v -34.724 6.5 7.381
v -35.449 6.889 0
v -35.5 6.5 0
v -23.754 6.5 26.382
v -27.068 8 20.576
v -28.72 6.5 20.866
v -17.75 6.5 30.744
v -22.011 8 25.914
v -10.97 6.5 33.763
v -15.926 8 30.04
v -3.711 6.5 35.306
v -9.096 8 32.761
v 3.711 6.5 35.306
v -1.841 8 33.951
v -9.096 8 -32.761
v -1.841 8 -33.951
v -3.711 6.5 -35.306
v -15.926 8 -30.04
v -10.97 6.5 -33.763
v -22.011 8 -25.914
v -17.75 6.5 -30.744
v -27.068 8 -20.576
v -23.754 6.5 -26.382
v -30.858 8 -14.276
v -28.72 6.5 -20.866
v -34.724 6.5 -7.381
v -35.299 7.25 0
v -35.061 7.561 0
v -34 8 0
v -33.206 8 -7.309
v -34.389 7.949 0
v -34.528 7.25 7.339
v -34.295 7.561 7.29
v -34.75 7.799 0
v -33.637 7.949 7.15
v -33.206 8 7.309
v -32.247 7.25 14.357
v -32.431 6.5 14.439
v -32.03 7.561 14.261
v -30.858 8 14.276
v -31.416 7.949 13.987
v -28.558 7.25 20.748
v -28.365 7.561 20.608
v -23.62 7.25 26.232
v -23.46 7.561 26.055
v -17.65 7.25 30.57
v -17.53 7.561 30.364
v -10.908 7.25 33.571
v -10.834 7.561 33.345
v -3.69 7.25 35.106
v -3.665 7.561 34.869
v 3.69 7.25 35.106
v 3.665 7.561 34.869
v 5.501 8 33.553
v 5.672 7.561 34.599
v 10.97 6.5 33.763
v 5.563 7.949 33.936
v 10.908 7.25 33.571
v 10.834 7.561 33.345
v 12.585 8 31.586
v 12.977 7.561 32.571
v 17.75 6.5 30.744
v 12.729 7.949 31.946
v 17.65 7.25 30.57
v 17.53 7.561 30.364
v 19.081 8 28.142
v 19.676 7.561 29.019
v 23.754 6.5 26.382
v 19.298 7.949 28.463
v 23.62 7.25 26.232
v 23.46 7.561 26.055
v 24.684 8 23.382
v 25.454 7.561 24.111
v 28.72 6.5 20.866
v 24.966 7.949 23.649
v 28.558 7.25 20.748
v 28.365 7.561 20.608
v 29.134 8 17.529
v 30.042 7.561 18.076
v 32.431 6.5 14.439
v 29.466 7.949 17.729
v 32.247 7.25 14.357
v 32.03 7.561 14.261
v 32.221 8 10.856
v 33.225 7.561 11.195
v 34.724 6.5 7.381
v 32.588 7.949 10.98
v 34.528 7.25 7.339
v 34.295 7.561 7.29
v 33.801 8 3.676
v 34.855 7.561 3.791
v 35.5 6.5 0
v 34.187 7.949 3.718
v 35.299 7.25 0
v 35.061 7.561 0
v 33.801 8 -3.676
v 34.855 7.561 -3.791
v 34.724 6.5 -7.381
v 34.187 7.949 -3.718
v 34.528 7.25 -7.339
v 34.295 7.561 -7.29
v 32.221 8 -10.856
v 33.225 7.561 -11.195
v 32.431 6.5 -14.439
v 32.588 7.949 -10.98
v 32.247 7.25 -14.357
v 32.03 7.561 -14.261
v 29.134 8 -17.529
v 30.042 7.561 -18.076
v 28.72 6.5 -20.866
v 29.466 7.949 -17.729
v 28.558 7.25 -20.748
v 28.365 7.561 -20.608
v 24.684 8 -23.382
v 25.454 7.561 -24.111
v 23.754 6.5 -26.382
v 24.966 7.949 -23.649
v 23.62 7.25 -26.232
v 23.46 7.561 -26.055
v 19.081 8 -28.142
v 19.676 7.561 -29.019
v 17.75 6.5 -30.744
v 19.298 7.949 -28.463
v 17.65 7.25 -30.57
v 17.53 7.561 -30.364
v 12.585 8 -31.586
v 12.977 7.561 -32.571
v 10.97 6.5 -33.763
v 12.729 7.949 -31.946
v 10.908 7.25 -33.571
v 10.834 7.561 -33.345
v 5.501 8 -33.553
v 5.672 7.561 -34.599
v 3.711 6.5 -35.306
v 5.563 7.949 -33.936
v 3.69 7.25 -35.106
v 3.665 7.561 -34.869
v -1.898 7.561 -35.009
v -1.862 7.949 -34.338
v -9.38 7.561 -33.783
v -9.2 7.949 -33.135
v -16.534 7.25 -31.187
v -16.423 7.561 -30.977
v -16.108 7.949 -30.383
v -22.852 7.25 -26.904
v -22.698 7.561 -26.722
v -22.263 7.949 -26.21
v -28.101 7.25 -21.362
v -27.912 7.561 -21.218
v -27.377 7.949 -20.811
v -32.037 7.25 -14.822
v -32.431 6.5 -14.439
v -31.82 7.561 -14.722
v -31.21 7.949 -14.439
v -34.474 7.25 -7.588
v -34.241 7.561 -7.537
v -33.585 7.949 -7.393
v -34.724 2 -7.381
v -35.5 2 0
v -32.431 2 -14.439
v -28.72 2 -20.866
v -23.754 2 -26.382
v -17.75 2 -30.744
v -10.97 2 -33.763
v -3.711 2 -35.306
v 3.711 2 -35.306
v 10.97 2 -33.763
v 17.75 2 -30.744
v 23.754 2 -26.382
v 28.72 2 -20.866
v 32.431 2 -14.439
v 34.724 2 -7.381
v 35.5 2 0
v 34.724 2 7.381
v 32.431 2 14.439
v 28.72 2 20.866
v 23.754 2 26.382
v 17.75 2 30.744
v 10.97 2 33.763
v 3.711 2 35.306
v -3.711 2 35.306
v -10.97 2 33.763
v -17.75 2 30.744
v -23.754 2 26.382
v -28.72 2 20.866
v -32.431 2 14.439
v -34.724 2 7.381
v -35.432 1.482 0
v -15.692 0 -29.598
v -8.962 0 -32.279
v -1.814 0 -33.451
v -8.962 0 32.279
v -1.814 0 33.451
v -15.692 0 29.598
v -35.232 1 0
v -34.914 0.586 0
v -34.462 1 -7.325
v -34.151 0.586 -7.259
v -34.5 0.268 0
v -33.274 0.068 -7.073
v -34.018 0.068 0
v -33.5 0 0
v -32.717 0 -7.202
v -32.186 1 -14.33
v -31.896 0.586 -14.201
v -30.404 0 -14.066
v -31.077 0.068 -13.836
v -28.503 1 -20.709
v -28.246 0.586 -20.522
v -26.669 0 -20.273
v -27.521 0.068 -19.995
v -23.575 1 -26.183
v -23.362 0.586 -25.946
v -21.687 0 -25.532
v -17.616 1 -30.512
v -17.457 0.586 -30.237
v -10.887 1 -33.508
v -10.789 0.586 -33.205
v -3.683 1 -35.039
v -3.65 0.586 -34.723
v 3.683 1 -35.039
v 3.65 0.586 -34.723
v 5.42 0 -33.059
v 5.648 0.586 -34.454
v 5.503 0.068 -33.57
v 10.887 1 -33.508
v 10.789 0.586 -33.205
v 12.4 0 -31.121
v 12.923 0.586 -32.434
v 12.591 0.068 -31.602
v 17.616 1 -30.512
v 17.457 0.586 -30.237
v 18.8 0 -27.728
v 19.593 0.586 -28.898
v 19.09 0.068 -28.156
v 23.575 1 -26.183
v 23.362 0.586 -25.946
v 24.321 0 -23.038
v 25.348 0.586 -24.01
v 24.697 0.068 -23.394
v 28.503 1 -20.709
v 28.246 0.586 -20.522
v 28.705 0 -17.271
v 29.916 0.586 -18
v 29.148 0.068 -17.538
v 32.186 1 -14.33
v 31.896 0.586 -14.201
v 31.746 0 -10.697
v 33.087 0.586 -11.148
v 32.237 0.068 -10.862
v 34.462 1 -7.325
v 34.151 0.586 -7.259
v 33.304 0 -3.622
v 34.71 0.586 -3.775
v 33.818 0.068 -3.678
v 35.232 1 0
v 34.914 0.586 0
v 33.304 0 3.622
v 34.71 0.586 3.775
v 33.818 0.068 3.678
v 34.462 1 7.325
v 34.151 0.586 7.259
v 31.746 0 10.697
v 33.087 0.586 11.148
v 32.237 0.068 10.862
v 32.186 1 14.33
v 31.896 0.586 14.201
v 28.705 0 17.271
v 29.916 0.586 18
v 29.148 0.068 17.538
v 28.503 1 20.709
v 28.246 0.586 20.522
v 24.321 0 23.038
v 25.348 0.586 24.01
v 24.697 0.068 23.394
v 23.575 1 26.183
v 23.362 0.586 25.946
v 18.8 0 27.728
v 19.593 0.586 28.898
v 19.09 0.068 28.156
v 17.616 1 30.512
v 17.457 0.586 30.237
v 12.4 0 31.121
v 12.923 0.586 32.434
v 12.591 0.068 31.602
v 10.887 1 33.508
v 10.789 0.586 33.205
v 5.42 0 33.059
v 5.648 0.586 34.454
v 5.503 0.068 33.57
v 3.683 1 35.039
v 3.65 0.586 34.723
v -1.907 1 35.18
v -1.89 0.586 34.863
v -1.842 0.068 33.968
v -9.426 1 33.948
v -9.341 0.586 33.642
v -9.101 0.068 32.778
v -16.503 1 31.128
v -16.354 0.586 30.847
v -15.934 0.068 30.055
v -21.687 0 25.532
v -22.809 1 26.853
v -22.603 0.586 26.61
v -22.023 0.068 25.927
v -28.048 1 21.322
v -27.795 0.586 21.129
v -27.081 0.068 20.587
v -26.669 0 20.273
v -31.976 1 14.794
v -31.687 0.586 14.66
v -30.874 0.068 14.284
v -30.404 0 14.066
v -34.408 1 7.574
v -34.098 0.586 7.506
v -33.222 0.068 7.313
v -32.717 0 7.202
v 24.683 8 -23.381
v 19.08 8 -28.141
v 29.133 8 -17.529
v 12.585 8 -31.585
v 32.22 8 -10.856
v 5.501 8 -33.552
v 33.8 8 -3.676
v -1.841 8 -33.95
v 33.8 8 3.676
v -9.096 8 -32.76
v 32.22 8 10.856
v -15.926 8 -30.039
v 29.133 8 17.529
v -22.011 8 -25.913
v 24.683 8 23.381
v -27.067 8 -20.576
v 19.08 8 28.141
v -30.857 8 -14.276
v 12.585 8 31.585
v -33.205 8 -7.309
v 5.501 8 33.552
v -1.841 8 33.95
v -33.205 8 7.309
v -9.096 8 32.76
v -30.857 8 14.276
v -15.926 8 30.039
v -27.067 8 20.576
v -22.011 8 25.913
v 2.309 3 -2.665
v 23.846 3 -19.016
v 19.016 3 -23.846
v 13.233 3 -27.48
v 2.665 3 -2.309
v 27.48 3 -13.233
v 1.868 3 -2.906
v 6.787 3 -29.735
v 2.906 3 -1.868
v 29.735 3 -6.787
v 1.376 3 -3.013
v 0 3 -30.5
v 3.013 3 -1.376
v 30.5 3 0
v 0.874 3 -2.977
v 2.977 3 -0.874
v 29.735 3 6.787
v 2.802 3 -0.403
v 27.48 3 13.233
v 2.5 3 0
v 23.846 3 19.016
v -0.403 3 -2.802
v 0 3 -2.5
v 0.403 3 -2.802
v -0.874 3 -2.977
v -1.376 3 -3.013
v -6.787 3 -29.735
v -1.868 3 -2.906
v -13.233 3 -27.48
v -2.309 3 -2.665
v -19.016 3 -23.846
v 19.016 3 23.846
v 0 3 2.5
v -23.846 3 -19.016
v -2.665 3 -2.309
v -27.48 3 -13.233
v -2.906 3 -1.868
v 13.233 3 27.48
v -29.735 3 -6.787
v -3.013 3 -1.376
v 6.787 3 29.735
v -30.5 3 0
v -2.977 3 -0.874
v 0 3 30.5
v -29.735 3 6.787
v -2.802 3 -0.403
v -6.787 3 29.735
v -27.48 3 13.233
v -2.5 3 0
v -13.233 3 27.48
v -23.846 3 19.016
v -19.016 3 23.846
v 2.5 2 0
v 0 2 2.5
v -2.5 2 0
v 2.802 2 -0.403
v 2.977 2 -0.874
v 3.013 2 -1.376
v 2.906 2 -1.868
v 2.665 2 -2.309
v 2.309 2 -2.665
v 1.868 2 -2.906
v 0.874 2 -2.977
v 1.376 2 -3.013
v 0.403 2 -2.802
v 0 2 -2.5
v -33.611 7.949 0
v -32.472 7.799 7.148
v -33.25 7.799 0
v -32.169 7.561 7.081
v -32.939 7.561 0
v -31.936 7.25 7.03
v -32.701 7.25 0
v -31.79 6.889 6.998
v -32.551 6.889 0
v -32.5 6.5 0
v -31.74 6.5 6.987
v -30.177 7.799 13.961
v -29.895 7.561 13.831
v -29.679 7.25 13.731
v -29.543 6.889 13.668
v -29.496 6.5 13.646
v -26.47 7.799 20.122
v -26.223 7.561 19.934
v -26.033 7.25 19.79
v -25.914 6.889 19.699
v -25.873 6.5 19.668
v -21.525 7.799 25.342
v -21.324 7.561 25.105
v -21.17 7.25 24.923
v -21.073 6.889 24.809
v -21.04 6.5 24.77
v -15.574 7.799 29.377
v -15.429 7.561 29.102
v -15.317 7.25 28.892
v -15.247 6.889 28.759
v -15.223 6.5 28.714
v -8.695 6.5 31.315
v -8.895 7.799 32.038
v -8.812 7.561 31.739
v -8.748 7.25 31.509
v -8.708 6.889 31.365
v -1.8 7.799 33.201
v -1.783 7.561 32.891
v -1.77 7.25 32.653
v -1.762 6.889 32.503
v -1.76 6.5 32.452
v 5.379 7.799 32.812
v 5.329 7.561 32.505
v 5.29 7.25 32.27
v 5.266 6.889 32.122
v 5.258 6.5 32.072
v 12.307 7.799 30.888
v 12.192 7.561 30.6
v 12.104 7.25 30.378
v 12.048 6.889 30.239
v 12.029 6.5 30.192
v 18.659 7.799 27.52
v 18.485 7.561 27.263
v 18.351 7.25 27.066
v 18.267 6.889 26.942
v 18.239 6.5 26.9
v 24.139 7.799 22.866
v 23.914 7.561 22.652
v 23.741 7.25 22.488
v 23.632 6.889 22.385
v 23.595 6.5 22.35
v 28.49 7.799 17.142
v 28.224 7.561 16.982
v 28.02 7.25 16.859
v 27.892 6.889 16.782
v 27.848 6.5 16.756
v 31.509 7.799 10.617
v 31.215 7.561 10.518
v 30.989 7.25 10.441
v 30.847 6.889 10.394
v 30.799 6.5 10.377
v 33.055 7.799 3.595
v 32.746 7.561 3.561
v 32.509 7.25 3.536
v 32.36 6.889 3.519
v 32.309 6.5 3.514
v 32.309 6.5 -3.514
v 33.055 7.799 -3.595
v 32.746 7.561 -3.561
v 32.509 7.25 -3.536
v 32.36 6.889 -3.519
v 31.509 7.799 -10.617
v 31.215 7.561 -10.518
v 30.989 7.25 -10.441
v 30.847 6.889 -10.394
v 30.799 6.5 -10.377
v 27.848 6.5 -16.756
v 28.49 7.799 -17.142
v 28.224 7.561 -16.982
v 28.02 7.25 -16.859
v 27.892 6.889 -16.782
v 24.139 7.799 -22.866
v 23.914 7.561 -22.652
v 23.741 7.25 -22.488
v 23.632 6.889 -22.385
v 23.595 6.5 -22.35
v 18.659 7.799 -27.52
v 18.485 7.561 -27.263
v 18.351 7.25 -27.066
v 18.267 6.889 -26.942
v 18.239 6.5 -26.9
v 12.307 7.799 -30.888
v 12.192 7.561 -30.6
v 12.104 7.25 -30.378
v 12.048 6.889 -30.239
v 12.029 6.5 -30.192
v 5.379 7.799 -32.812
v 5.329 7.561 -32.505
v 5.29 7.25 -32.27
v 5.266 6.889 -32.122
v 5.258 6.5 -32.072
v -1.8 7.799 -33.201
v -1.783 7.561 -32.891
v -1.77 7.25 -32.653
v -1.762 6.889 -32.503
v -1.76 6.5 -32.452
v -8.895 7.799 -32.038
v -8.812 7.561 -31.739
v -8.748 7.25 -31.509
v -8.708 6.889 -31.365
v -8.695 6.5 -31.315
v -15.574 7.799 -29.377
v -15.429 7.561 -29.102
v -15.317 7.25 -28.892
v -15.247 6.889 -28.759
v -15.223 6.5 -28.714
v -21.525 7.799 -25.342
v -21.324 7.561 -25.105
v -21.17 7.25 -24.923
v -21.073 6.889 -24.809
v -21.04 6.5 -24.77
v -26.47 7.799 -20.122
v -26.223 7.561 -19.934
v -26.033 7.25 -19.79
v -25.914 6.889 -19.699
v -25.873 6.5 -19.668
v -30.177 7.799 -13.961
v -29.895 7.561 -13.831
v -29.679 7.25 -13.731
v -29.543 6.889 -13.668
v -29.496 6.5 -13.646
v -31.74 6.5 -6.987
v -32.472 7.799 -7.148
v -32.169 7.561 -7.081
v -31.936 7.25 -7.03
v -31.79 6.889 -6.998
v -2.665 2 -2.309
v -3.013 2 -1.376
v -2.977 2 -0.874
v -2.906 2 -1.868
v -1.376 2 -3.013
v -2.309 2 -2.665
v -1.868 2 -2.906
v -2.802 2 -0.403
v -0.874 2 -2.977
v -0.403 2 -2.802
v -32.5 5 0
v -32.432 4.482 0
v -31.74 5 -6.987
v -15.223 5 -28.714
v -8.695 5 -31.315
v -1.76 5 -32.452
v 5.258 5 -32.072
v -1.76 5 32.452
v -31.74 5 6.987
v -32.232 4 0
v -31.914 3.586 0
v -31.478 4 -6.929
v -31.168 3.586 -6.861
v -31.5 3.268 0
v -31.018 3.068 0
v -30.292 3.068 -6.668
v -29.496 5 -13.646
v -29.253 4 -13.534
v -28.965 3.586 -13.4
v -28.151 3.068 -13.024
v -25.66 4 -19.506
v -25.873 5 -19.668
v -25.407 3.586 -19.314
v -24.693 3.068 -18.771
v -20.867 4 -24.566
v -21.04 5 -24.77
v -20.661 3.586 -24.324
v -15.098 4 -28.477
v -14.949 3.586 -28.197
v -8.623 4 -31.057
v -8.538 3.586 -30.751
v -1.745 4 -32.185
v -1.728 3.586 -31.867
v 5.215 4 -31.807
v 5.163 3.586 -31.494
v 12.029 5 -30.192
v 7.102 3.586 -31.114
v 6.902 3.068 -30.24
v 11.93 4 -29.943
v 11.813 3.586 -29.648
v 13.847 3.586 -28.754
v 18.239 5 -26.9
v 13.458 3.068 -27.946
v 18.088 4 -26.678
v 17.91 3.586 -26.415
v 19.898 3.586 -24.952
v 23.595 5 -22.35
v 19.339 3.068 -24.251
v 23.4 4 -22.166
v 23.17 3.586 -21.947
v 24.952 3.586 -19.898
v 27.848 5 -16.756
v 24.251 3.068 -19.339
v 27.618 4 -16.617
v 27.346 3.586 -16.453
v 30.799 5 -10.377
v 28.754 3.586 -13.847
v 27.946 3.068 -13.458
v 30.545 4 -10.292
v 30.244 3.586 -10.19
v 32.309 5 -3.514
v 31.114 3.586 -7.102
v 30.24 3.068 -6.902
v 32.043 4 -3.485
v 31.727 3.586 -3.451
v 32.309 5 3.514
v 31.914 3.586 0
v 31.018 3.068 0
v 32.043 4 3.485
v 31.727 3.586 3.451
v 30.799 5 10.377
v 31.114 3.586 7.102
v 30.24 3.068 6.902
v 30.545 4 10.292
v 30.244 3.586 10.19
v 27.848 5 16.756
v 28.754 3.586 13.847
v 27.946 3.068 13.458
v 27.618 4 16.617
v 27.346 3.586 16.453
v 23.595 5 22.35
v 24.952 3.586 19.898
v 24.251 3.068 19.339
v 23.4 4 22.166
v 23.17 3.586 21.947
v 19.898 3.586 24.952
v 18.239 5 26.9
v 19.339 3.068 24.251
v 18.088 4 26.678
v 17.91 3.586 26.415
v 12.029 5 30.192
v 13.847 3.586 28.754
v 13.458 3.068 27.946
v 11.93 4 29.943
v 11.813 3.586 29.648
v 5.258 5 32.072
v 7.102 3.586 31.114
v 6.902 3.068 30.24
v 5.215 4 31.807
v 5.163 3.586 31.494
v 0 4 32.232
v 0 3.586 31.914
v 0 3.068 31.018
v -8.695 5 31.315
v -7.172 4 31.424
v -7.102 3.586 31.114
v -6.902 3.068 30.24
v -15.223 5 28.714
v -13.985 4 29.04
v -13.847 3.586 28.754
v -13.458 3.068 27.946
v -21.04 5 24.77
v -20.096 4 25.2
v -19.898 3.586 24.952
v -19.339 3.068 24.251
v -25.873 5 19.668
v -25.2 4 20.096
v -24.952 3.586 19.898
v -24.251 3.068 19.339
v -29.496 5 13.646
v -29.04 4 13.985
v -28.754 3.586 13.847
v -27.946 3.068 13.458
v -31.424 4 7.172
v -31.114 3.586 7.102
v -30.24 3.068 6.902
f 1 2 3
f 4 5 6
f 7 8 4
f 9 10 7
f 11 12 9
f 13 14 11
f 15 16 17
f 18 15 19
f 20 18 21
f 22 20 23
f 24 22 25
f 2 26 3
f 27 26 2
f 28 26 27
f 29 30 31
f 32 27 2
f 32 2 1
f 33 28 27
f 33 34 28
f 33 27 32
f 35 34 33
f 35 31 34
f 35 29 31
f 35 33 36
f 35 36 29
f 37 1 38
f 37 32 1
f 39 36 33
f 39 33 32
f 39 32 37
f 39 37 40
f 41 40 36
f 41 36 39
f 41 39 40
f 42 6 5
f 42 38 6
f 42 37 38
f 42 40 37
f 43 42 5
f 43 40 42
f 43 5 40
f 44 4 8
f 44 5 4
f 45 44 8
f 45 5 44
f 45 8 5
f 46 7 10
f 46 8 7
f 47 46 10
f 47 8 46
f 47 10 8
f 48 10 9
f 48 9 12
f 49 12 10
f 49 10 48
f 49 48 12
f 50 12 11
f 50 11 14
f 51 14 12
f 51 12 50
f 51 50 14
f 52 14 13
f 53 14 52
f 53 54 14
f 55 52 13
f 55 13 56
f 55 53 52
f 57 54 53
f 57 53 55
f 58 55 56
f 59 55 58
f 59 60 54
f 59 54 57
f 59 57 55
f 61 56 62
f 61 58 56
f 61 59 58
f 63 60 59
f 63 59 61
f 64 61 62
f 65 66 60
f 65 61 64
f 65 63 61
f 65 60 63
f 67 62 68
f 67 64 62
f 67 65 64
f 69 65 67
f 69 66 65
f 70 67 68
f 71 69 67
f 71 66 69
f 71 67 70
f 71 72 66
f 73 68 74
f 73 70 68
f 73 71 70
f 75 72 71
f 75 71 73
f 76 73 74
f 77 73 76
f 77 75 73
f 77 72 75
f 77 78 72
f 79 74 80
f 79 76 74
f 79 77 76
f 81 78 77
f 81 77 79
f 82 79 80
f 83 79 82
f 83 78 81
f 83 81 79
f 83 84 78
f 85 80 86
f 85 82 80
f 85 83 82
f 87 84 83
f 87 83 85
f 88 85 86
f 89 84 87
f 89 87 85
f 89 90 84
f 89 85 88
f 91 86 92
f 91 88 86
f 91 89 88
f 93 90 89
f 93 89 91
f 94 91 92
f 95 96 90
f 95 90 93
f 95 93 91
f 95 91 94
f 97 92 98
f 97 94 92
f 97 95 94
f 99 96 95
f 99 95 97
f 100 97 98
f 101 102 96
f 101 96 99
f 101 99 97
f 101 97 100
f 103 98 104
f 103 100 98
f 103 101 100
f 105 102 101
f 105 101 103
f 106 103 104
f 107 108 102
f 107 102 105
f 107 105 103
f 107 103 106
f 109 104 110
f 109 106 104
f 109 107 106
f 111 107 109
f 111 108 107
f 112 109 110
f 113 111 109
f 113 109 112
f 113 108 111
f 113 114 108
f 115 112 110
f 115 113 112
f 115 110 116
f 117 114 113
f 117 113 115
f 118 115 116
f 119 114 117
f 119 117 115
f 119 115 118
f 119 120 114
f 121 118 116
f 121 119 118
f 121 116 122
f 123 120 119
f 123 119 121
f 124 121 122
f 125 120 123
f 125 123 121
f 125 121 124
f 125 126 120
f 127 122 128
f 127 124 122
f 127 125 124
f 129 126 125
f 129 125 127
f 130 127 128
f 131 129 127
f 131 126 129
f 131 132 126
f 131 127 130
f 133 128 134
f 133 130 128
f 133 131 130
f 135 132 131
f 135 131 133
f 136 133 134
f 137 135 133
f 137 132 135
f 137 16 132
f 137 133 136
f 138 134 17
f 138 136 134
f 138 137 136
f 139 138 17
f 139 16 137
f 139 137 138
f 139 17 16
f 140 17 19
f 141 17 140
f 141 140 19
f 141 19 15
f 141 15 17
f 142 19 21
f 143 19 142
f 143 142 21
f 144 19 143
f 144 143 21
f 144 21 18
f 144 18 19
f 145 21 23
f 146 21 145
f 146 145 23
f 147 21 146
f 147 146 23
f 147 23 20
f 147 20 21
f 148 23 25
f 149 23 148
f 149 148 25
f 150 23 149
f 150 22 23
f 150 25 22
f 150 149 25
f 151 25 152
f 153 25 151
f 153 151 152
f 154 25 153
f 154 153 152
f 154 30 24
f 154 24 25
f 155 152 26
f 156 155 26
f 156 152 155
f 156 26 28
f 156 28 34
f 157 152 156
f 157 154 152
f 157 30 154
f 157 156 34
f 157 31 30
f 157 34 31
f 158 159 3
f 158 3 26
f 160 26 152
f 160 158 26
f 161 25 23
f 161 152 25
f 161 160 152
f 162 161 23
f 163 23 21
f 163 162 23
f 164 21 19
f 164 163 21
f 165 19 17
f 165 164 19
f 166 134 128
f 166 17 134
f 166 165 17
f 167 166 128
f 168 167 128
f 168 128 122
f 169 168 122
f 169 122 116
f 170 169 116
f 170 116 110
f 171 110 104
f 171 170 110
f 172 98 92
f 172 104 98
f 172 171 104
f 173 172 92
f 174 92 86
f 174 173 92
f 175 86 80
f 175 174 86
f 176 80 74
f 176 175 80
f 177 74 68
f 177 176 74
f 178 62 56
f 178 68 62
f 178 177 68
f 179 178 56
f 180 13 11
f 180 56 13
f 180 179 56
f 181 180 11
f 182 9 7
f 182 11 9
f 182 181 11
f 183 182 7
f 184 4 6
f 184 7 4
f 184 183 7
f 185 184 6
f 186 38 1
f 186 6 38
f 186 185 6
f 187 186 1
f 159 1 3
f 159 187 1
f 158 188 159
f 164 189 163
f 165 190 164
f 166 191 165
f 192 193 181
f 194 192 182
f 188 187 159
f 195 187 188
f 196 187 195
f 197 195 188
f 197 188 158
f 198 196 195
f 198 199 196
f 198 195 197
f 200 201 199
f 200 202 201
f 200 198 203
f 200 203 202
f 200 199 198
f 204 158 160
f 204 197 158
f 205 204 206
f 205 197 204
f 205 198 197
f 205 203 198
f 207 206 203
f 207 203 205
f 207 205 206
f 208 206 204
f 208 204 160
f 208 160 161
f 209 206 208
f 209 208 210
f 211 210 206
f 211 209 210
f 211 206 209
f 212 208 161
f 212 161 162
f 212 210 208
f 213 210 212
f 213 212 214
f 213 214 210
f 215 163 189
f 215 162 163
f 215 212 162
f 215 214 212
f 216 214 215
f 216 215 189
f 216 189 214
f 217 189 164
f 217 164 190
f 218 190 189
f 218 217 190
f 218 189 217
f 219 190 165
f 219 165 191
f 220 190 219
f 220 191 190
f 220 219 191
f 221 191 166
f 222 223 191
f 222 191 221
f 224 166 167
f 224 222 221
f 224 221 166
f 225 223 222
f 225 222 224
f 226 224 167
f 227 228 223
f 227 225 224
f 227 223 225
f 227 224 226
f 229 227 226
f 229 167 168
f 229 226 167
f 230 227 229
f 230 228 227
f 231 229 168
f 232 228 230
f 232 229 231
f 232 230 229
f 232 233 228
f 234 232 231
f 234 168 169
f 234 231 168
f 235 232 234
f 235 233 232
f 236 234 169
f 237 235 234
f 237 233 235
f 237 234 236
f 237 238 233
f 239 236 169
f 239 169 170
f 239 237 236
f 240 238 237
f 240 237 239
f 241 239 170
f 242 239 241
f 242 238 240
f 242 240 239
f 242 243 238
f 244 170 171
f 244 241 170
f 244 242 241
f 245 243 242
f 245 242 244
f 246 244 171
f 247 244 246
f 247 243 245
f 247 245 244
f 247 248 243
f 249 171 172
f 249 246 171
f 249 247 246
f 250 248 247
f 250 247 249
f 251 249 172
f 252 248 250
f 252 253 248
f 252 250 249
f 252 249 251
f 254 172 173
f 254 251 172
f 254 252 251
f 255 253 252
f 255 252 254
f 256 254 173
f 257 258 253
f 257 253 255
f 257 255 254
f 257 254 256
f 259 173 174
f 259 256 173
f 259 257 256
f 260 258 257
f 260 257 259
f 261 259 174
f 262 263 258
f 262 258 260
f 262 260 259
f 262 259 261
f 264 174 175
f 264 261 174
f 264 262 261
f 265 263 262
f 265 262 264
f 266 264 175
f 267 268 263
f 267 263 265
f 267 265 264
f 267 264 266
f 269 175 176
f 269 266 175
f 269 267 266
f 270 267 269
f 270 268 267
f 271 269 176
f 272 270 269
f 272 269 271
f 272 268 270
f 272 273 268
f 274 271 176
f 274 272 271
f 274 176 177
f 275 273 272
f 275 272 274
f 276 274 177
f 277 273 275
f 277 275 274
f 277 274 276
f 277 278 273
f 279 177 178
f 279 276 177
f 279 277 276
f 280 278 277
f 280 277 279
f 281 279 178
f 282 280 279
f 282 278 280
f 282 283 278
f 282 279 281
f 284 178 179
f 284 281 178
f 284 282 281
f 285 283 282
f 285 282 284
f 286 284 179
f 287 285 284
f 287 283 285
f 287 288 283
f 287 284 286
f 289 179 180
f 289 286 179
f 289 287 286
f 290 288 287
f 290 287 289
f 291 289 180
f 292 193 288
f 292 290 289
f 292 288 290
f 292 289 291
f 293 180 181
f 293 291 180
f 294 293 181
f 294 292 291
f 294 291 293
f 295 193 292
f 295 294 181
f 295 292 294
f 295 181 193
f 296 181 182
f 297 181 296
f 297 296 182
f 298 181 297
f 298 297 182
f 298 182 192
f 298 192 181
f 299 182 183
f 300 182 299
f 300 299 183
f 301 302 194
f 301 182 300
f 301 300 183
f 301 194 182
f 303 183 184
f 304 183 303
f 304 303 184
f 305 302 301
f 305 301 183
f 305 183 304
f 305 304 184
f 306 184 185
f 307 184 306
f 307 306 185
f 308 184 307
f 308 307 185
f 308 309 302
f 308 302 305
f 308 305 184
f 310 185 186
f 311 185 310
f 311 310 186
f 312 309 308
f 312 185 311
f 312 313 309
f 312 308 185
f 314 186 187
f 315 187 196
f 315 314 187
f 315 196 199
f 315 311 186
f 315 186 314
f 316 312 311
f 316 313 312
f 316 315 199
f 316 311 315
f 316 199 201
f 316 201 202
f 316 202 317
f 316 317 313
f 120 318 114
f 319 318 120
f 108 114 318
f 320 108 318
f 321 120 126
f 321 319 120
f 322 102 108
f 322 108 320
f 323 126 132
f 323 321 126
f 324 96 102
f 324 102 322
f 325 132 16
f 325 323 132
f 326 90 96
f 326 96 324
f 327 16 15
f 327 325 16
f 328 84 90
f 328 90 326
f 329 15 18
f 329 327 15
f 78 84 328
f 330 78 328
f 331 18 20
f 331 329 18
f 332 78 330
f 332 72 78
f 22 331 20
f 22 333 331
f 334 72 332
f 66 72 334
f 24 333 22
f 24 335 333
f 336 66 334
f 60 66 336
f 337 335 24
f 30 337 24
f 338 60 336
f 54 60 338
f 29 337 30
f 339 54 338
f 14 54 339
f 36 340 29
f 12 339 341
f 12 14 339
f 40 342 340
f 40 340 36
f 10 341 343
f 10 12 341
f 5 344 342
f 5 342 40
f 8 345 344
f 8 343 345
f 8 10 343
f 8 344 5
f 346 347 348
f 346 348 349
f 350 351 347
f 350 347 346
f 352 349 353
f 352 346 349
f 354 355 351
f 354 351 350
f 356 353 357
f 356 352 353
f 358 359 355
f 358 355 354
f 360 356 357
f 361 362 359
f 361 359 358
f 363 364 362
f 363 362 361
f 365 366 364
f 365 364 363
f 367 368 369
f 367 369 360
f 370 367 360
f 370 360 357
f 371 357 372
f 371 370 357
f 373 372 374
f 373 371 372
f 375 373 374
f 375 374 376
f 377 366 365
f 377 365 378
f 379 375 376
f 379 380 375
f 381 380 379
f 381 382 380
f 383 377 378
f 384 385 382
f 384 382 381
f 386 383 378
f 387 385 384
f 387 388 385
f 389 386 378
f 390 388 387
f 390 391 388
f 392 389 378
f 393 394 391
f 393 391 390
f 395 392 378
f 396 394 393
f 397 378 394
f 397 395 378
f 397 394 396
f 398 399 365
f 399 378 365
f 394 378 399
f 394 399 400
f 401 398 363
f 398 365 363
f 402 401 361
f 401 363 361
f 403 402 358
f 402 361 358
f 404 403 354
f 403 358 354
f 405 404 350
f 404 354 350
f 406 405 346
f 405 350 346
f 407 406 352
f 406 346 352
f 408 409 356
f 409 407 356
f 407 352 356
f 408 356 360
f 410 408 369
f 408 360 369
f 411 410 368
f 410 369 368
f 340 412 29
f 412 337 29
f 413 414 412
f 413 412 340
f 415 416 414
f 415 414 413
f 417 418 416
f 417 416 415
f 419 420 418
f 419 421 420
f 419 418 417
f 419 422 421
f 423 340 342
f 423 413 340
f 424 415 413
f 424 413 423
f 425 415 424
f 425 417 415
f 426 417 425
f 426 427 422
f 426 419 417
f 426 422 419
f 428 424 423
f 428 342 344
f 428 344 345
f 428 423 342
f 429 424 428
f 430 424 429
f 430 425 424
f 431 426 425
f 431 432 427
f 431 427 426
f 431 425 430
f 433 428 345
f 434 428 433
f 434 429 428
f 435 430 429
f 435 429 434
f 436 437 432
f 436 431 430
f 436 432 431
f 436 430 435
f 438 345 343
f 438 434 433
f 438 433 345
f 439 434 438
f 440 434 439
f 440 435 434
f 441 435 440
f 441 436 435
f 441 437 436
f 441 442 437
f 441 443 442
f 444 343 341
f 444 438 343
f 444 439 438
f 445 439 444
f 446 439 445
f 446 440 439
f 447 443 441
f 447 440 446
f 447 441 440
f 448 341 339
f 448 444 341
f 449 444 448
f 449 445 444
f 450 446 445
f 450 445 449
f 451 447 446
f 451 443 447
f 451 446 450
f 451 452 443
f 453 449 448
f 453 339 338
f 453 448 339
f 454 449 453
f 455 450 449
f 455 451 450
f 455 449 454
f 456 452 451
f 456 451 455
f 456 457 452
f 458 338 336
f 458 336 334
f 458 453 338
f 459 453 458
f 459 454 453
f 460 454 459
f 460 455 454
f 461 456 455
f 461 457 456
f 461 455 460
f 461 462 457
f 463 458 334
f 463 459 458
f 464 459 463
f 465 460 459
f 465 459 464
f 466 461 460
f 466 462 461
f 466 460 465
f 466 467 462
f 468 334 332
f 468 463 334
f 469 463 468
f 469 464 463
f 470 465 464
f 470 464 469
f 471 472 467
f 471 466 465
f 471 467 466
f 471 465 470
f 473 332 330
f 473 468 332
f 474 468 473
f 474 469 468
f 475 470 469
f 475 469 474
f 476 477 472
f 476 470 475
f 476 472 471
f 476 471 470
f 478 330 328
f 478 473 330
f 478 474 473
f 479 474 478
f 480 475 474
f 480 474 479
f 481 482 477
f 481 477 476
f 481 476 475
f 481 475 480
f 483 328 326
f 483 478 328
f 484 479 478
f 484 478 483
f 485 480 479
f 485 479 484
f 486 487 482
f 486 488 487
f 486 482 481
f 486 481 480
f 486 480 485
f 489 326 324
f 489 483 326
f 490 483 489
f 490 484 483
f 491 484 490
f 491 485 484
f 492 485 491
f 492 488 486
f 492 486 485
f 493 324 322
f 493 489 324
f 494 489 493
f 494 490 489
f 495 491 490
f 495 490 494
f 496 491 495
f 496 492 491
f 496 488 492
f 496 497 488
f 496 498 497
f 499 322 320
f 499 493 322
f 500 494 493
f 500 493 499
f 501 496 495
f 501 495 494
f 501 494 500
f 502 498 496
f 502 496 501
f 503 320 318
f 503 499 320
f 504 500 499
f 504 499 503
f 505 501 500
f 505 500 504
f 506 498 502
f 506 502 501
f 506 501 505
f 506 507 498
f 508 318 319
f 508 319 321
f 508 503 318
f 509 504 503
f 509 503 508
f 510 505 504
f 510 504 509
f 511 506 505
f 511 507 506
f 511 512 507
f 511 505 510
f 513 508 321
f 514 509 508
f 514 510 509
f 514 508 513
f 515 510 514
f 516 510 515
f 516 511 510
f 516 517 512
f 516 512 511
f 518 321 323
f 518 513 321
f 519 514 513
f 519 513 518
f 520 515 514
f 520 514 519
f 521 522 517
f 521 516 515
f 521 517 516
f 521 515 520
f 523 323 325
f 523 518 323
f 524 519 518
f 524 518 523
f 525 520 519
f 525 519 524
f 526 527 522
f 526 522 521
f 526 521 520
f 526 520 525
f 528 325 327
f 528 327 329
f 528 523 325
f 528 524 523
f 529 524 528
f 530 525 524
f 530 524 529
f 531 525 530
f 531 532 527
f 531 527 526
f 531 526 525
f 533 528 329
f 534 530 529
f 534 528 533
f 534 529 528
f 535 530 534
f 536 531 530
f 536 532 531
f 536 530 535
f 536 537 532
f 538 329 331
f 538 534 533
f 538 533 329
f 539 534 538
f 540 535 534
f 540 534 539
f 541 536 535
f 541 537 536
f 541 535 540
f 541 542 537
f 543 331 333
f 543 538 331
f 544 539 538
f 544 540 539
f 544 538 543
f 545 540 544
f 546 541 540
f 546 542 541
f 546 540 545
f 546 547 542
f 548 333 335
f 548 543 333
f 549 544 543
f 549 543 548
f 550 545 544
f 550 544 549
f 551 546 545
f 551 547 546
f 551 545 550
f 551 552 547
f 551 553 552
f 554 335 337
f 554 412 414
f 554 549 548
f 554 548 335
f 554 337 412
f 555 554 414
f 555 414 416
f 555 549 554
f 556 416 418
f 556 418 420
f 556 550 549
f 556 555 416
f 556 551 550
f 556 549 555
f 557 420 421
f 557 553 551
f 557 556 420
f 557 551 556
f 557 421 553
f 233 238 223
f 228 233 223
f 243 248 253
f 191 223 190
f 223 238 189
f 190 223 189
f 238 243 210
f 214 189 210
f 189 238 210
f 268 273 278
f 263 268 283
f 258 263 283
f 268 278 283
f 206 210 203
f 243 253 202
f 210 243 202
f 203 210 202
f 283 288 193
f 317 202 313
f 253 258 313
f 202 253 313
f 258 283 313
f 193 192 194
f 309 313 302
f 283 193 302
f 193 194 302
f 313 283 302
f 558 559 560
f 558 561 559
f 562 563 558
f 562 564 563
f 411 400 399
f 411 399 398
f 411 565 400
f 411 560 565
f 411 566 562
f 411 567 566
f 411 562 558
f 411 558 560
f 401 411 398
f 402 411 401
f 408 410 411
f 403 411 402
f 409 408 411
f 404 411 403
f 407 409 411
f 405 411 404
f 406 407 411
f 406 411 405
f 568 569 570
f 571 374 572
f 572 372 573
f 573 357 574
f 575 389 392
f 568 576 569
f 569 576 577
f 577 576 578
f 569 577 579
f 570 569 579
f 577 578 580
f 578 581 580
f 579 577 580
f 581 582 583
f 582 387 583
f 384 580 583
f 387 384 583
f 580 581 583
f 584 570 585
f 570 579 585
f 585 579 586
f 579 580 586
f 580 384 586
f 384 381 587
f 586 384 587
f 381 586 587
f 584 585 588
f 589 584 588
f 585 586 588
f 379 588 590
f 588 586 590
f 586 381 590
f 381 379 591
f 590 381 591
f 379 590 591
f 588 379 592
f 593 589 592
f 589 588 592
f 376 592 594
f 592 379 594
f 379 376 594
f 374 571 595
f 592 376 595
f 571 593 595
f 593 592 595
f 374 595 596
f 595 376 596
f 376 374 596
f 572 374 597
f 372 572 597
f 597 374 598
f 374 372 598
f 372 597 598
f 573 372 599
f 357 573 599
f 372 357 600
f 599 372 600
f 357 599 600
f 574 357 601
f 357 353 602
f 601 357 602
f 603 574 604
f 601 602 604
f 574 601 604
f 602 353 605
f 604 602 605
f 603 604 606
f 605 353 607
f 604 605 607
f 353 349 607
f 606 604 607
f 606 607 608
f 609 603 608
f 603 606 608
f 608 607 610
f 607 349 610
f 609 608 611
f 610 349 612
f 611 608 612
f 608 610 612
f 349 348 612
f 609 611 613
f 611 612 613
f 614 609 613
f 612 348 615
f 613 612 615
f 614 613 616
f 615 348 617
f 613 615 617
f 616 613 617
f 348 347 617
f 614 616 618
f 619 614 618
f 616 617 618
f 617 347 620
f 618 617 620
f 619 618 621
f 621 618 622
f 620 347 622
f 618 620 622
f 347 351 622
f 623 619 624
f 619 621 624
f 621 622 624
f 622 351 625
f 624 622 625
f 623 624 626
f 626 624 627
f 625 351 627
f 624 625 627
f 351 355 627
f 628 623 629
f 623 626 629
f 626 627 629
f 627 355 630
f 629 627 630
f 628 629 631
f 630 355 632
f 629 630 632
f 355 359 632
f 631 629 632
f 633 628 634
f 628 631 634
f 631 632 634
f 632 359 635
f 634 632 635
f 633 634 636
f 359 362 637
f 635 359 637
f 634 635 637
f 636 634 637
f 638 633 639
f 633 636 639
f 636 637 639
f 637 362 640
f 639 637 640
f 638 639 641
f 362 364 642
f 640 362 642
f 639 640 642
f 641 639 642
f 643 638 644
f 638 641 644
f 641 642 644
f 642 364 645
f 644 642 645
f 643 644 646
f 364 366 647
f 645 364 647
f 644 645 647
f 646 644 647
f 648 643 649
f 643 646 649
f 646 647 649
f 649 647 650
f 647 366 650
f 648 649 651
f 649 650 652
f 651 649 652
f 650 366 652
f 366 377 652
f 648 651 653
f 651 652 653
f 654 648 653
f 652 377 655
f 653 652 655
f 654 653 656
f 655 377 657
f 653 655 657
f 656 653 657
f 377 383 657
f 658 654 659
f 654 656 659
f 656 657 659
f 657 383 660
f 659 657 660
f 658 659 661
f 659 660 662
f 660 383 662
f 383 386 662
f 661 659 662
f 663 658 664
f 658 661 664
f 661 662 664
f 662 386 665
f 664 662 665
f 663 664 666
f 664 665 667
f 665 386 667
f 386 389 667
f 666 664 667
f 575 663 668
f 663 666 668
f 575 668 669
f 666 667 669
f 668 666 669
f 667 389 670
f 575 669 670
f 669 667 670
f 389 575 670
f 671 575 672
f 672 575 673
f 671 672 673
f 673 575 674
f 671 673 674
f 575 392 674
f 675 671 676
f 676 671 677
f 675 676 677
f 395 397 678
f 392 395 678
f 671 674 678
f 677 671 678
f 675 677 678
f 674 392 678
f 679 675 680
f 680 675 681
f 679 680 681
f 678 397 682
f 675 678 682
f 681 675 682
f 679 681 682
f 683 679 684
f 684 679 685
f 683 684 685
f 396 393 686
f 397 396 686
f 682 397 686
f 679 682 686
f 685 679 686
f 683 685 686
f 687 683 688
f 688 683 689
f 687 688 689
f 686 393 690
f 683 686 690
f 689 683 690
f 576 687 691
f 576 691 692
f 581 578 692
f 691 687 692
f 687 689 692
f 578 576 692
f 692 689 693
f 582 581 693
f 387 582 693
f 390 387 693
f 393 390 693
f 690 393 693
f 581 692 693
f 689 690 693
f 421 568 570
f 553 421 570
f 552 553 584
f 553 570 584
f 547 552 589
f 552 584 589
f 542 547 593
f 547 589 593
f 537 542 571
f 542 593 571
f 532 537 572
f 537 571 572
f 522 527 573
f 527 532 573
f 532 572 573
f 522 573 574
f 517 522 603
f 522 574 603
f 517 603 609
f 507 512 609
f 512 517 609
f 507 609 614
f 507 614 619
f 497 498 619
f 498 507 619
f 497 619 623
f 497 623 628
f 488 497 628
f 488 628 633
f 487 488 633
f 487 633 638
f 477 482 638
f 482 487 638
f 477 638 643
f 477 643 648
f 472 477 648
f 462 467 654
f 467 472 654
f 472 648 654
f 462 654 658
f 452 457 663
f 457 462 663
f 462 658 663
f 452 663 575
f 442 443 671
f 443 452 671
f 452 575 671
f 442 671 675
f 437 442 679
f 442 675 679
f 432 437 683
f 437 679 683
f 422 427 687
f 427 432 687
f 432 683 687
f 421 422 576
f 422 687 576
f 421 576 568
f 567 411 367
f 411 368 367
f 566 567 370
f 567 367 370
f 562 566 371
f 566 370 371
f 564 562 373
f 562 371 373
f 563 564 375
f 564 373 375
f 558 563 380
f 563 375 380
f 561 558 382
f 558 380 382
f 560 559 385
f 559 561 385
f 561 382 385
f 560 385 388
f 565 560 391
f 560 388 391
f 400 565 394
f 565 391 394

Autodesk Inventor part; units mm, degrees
ref_plane "YZ Plane" through (0, 0, 0) normal (1, 0, 0) x (0, 1, 0)
ref_plane "XZ Plane" through (0, 0, 0) normal (0, 1, 0) x (-1, 0, 0)
ref_plane "XY Plane" through (0, 0, 0) normal (0, 0, 1) x (1, 0, 0)
sketch "Sketch1" plane through (0, 0, 0) normal (0, 1, 0) x (-1, 0, 0)
  circle A0 centre (0, 0) radius 32.5
  circle A1 centre (0, 0) radius 35.5
  dimension "d0" = 65
  dimension "d1" = 71
extrude "Extrusion1" add sketch "Sketch1" along normal blind 8
extrude "Extrusion2" add sketch "Sketch1" along normal blind 3 contours A0
fillet "Fillet1" radius 2 2 edges at (35.5, 0, 0) (32.5, 3, 0)
fillet "Fillet2" radius 1.5 2 edges at (32.5, 8, 0) (35.5, 8, 0)
sketch "Sketch2" plane through (0, 3, 0) normal (0, 1, 0) x (1, 0, 0)
  line L0 (-2.5, -2.5) -> (2.5, -2.5)
  line L1 (2.5, -2.5) -> (2.5, 2.5)
  line L2 (2.5, 2.5) -> (-2.5, 2.5)
  line L3 (-2.5, 2.5) -> (-2.5, -2.5)
  line L4 (-2.5, -2.5) -> (2.5, 2.5) construction
  line L5 (2.5, -2.5) -> (-2.5, 2.5) construction
  line L6 (0, -2.5) -> (2.5, 0)
  line L7 (0, -2.5) -> (-2.5, 0)
  circle A0 centre (1.25, 1.25) radius 1.7678
  circle A1 centre (-1.25, 1.25) radius 1.7678
  point P0 (0, 0)
  point P1 (0, 2.5)
  dimension "d8" = 5
  dimension "d9" = 5
extrude "Extrusion3" cut sketch "Sketch2" against normal blind 1 contours L7 A1 A0 L6 | A1 L3 | L3 L2 A0 A1 | A0 A1 L2 L1 | L1 A0 | A1 L2 | A0 A1 | L2 A0
properties part number "Orchid Coaster V3"
